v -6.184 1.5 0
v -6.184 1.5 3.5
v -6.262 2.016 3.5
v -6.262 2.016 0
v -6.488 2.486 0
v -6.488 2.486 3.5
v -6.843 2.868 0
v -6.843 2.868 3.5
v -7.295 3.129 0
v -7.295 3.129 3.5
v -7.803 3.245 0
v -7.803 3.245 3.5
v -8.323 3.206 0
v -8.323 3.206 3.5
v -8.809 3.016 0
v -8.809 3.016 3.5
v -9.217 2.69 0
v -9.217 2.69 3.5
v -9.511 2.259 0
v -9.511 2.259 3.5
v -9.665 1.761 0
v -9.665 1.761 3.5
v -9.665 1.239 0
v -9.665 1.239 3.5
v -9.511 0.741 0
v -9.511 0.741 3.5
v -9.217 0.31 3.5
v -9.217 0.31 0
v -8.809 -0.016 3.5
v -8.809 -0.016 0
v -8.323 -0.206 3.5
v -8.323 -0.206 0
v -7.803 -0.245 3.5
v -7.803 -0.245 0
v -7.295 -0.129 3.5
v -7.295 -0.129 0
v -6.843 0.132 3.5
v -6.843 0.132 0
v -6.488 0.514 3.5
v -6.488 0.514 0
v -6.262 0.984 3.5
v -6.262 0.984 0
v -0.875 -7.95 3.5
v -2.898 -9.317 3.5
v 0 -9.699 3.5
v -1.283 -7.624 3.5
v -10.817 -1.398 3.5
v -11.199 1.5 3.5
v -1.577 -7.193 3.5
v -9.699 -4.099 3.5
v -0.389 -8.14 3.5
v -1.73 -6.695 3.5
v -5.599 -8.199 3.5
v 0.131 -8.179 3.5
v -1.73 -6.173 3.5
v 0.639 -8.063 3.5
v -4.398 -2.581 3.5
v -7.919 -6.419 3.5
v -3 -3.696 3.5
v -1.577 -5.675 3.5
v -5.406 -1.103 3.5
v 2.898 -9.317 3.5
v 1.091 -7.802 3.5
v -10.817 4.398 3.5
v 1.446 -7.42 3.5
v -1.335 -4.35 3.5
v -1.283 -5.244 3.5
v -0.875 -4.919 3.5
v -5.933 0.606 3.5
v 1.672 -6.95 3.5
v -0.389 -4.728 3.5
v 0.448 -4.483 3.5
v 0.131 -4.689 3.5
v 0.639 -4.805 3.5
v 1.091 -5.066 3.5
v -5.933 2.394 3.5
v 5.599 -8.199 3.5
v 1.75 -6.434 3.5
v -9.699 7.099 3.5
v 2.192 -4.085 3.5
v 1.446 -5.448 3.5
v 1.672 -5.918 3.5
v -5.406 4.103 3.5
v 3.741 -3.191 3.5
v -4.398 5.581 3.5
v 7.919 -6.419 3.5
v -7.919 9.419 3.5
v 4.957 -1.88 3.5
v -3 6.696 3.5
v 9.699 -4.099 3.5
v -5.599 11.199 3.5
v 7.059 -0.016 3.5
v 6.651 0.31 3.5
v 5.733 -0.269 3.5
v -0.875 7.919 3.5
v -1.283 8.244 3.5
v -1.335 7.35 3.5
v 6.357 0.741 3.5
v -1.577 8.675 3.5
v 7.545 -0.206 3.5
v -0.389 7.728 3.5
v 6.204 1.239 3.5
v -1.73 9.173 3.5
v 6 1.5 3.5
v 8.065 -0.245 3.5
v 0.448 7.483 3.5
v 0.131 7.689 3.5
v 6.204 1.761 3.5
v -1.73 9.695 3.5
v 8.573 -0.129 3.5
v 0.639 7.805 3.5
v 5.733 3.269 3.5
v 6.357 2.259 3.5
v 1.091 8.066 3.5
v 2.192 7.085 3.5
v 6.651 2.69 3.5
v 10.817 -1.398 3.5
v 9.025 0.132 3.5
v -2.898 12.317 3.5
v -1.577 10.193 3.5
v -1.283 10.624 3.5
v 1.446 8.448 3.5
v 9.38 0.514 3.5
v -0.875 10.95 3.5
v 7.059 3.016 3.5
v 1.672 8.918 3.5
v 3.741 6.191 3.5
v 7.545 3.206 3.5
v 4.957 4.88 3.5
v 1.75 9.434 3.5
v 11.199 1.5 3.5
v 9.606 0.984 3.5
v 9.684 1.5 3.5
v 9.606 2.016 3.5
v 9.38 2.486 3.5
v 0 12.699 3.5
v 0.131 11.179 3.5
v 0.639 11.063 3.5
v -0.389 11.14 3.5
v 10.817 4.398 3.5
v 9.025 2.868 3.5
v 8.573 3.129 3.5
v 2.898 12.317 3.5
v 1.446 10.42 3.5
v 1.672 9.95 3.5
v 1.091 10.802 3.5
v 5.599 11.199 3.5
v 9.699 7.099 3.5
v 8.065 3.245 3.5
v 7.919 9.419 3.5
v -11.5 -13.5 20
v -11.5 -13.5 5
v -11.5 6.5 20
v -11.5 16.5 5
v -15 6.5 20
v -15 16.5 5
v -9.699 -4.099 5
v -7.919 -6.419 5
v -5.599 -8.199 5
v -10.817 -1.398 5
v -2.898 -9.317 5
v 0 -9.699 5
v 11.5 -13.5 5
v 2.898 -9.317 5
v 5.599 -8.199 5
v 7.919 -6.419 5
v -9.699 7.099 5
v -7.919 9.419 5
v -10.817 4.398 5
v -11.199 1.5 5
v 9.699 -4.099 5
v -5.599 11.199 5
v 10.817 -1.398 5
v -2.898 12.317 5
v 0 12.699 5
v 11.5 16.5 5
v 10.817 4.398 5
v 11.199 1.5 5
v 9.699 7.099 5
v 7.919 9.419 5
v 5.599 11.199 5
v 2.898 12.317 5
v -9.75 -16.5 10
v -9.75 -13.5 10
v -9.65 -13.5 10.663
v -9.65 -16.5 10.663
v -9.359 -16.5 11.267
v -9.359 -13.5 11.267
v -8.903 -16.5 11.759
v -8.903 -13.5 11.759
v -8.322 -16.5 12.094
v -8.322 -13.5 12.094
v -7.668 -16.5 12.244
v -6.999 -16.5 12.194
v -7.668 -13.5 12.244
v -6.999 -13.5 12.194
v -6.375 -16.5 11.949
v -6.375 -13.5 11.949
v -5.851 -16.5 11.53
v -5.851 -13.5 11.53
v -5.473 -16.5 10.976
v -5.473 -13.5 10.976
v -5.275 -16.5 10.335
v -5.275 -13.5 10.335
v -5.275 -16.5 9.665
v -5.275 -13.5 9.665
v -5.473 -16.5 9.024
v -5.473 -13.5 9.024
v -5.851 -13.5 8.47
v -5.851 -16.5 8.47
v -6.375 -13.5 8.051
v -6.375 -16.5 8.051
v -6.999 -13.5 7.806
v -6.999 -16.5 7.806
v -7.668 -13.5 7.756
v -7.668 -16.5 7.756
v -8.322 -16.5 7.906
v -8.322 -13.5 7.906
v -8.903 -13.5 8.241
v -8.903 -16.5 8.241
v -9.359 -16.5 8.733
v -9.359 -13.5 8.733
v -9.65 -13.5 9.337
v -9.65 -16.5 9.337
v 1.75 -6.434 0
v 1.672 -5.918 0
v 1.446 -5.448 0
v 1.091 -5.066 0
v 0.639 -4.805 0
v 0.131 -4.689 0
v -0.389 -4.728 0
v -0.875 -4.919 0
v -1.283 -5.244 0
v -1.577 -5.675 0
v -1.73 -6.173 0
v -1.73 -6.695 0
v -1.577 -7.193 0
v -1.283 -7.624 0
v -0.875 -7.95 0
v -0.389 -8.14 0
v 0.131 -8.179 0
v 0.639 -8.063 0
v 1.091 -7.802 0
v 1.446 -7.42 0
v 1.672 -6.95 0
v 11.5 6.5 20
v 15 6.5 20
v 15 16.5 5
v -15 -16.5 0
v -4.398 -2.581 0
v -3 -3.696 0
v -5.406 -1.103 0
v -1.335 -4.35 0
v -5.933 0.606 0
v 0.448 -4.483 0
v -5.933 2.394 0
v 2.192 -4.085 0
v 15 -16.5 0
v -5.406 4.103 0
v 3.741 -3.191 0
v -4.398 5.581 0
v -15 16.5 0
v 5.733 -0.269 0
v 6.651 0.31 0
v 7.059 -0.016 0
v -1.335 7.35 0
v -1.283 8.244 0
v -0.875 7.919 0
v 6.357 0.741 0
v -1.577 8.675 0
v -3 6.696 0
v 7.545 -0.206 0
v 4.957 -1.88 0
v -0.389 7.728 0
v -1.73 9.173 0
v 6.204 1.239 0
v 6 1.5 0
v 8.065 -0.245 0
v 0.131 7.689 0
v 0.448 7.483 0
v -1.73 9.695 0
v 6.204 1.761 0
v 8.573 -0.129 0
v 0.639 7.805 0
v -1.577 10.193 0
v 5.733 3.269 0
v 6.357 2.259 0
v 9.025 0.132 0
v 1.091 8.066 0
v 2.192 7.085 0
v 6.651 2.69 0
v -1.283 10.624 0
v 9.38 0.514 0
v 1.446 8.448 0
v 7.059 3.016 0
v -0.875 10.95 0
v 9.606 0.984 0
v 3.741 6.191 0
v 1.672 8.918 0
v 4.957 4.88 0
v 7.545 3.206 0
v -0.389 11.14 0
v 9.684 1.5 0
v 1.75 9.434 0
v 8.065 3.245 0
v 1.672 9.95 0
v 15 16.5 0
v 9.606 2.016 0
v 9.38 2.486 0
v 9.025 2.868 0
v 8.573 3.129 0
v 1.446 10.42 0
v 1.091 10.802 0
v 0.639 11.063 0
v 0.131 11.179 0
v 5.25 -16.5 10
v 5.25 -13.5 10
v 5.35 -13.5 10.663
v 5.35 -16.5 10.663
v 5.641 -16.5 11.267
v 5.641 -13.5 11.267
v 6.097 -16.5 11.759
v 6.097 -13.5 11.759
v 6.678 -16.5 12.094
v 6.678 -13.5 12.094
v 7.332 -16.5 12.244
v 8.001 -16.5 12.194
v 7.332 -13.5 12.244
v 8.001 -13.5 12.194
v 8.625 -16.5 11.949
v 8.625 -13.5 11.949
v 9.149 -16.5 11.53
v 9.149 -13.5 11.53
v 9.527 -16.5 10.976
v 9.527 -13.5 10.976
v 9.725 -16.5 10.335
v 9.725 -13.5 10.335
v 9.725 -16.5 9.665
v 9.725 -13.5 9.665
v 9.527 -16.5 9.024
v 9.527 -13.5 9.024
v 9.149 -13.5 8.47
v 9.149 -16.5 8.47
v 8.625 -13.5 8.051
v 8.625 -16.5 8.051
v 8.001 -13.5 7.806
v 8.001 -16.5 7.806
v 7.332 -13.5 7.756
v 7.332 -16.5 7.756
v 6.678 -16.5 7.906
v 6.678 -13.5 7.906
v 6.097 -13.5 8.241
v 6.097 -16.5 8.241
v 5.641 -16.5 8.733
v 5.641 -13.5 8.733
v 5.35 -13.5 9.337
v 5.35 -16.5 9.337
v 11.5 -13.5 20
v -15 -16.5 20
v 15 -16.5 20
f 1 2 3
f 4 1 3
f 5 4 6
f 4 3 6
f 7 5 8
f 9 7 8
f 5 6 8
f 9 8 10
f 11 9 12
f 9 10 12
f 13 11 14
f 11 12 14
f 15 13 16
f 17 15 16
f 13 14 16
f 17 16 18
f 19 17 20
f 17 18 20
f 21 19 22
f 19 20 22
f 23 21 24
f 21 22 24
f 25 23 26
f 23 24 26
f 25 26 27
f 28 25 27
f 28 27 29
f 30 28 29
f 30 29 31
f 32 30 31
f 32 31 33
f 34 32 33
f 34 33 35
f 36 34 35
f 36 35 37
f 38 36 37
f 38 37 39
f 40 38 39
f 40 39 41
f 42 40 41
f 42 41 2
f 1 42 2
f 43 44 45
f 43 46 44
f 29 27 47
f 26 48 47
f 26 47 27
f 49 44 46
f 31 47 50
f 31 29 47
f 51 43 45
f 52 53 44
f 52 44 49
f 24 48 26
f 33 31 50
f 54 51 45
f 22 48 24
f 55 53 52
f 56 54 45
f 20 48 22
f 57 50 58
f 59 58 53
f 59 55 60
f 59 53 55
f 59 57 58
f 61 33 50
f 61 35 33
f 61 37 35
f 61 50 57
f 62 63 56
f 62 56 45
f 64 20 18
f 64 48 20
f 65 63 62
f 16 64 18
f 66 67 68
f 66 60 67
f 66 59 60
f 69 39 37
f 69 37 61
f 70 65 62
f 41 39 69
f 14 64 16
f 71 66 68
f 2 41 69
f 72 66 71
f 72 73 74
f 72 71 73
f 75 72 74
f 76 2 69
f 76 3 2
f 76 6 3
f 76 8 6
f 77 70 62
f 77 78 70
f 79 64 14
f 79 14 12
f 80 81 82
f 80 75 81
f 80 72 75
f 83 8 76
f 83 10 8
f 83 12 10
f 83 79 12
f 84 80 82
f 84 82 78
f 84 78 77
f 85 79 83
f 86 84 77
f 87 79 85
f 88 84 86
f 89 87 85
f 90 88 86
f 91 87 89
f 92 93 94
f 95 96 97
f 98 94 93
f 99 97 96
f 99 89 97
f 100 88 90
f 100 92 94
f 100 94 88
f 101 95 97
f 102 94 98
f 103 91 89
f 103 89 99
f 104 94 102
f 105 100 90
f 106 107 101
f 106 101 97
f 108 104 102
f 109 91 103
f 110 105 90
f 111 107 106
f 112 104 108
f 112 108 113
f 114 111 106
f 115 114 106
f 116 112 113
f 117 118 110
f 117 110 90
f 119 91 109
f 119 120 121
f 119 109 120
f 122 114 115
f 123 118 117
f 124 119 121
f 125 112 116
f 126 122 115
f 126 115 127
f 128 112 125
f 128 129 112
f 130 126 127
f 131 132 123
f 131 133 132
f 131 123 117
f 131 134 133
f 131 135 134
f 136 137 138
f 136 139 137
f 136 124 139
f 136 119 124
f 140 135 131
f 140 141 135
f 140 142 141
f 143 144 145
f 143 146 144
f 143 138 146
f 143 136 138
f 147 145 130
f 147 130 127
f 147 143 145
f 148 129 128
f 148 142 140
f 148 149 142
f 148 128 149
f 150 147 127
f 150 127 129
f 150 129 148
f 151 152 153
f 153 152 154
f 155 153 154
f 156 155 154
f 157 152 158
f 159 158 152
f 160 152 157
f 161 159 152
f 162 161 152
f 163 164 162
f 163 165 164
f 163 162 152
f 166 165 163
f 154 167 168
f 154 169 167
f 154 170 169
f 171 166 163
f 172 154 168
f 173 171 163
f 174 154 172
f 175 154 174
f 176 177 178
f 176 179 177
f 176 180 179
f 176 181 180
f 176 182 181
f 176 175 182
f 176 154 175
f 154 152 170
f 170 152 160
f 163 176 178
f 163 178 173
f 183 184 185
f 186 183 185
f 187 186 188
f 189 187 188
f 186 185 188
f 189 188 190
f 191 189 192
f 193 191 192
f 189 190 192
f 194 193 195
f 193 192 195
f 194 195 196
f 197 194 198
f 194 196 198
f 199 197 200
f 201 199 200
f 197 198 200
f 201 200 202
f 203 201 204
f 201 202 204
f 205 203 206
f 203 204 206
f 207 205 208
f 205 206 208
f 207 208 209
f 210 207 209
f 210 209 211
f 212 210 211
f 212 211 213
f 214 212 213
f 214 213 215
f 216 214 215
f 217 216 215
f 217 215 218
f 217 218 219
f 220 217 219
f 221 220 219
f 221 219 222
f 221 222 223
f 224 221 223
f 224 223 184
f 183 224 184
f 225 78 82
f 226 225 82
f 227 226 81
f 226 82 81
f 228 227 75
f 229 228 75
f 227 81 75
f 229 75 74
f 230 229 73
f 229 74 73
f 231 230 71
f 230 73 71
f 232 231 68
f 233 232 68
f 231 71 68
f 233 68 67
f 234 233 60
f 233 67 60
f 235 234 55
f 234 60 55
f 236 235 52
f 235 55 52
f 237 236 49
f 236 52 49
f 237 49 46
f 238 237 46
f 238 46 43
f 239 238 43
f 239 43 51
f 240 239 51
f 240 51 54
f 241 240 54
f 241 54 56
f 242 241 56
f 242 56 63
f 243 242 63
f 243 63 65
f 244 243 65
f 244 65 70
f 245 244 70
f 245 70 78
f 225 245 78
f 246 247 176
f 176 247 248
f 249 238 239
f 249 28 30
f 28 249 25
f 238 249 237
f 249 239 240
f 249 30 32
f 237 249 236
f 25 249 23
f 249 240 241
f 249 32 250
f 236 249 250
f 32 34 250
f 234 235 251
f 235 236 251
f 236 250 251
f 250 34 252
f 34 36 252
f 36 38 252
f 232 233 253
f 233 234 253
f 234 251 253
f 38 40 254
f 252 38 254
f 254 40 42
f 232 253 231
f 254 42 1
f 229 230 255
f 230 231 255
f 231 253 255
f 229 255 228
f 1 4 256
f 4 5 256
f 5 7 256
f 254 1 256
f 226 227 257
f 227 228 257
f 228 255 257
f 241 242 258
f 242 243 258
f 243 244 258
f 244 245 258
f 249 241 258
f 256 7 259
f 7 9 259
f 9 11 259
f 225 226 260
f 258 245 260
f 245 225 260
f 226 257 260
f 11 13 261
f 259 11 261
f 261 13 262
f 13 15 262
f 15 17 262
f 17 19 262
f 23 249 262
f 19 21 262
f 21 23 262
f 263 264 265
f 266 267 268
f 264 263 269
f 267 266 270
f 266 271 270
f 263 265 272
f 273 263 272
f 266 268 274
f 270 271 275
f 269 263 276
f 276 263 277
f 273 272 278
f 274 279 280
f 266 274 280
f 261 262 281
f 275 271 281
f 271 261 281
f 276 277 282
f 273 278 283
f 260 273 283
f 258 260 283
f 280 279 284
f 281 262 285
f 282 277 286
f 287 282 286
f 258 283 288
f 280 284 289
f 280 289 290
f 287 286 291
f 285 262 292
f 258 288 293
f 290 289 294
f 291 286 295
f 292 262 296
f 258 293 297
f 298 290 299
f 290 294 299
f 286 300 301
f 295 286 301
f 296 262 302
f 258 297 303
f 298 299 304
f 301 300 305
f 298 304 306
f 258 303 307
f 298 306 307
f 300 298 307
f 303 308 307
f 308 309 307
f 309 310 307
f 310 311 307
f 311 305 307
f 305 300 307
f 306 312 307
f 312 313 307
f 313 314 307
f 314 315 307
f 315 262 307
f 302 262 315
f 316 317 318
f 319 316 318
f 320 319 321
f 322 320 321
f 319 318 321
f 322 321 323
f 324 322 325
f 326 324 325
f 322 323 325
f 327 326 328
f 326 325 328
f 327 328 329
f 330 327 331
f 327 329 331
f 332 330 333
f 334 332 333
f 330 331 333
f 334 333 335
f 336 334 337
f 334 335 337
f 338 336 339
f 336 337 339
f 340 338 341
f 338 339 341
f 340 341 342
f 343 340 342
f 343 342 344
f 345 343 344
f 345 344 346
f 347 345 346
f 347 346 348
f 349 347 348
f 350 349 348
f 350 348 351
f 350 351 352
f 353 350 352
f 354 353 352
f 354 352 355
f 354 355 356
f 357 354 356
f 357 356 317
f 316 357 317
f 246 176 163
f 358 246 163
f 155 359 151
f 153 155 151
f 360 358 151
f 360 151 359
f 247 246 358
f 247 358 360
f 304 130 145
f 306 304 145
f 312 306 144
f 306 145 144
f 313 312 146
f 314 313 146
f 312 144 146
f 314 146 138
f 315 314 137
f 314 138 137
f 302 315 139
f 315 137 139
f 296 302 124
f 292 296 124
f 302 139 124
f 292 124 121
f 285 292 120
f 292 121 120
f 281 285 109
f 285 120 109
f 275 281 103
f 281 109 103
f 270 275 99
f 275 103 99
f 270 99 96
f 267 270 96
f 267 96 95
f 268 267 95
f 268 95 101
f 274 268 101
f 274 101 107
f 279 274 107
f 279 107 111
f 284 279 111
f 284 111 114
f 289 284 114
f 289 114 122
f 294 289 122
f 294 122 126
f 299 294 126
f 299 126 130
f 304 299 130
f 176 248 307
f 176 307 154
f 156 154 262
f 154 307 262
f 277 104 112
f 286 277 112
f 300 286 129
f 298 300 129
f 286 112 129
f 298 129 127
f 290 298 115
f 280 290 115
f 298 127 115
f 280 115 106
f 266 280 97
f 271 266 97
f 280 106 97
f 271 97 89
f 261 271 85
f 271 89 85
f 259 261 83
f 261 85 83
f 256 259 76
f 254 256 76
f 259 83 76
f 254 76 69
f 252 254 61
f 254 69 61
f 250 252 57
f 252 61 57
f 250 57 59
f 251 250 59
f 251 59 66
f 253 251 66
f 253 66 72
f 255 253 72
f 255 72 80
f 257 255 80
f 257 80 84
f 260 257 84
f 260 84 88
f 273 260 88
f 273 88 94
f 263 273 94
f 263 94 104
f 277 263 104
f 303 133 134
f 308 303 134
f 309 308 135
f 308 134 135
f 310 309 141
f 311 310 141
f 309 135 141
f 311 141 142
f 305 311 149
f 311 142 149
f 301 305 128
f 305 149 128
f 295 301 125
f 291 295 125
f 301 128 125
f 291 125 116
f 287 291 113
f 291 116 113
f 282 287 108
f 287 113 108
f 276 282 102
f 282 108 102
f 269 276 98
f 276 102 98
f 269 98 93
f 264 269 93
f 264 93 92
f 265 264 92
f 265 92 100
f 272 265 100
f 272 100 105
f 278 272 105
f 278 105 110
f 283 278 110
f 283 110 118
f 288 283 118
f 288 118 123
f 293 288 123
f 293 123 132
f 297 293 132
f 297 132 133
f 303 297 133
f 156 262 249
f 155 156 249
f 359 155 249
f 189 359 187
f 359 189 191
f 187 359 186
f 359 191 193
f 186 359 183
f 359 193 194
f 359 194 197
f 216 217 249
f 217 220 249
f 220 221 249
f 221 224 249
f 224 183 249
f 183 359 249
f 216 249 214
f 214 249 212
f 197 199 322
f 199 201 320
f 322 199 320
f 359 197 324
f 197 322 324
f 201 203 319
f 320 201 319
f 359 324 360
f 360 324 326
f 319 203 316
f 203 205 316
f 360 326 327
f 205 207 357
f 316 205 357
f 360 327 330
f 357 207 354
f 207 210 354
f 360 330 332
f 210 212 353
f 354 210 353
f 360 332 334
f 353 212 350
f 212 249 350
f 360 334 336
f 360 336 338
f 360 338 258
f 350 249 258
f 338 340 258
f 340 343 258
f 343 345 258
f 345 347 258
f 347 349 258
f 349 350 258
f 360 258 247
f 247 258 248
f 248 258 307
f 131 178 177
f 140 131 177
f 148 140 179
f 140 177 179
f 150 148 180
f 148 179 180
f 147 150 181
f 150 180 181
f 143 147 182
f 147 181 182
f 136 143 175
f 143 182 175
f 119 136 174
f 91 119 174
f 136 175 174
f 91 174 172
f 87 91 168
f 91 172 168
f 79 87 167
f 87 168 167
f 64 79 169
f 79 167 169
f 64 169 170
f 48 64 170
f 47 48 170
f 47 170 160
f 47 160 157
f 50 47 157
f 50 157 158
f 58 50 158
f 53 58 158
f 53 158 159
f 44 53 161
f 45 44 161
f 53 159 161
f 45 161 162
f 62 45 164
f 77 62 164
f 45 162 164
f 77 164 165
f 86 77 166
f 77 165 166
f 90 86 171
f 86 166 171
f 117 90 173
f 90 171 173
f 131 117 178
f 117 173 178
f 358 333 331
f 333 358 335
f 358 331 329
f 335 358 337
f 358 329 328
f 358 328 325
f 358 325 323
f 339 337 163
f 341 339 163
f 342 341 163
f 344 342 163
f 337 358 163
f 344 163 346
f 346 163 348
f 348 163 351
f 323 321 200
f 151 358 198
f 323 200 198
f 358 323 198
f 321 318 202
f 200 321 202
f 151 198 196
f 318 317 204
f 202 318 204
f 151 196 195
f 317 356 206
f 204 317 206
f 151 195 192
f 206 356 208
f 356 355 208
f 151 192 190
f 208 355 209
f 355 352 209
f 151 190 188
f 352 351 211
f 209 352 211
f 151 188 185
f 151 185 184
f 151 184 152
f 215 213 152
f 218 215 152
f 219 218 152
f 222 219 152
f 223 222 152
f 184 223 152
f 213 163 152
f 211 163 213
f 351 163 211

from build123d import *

# Parameters (mm, degrees)
SKETCH1_W           = 30
SKETCH1_H           = 33
BOSS_EXTRUDE1_DEPTH = 5
BOSS_EXTRUDE2_DEPTH = 15
CUT_EXTRUDE1_DEPTH  = 40.651607786
SKETCH4_R           = 6
SKETCH4_R_2         = 1.75
CUT_EXTRUDE2_DEPTH  = 27.874709301
SKETCH5_R           = 11.1989
CUT_EXTRUDE3_DEPTH  = 1.5
SKETCH6_R           = 2.25
CUT_EXTRUDE4_DEPTH  = 40.05124838


with BuildPart() as part:
    # Sketch1 → Boss-Extrude1 (new body)
    with BuildSketch(Plane.XY):
        Rectangle(SKETCH1_W, SKETCH1_H)
    extrude(amount=BOSS_EXTRUDE1_DEPTH)

    # Sketch2 → Boss-Extrude2 (add)
    with BuildSketch(Plane.XY.offset(5)):
        Polygon((-15, 16.5), (-15, -16.5), (15, -16.5), (15, 16.5), (11.5, 16.5), (11.5, -13.5), (-11.5, -13.5), (-11.5, 16.5), align=None)
    extrude(amount=BOSS_EXTRUDE2_DEPTH)

    # Sketch3 → Cut-Extrude1 (cut, through all)
    with BuildSketch(Plane(origin=(15, 0, 0), x_dir=(0, 0, -1), z_dir=(1, 0, 0))):
        Polygon((-5, 16.5), (-20, 16.5), (-20, 6.5), align=None)
    extrude(amount=-CUT_EXTRUDE1_DEPTH, mode=Mode.SUBTRACT)

    # Sketch4 → Cut-Extrude2 (cut, through all)
    with BuildSketch(Plane.XY.offset(5)):
        with Locations((0, 1.5)):
            Circle(SKETCH4_R)
        with Locations((0, 9.43405)):
            Circle(SKETCH4_R_2)
        with Locations((-7.93405, 1.5)):
            Circle(SKETCH4_R_2)
        with Locations((7.93405, 1.5)):
            Circle(SKETCH4_R_2)
        with Locations((0, -6.43405)):
            Circle(SKETCH4_R_2)
    extrude(amount=-CUT_EXTRUDE2_DEPTH, mode=Mode.SUBTRACT)

    # Sketch5 → Cut-Extrude3 (cut)
    with BuildSketch(Plane.XY.offset(5)):
        with Locations((0, 1.5)):
            Circle(SKETCH5_R)
    extrude(amount=-CUT_EXTRUDE3_DEPTH, mode=Mode.SUBTRACT)

    # Sketch6 → Cut-Extrude4 (cut, through all)
    with BuildSketch(Plane(origin=(0, -13.5, 0), x_dir=(1, 0, 0), z_dir=(0, 1, 0))):
        with Locations(Location((-7.5, -10, 0), (0, 0, 180))):
            Circle(SKETCH6_R)
        with Locations(Location((7.5, -10, 0), (0, 0, 180))):
            Circle(SKETCH6_R)
    extrude(amount=-CUT_EXTRUDE4_DEPTH, mode=Mode.SUBTRACT)


solid = part.part
